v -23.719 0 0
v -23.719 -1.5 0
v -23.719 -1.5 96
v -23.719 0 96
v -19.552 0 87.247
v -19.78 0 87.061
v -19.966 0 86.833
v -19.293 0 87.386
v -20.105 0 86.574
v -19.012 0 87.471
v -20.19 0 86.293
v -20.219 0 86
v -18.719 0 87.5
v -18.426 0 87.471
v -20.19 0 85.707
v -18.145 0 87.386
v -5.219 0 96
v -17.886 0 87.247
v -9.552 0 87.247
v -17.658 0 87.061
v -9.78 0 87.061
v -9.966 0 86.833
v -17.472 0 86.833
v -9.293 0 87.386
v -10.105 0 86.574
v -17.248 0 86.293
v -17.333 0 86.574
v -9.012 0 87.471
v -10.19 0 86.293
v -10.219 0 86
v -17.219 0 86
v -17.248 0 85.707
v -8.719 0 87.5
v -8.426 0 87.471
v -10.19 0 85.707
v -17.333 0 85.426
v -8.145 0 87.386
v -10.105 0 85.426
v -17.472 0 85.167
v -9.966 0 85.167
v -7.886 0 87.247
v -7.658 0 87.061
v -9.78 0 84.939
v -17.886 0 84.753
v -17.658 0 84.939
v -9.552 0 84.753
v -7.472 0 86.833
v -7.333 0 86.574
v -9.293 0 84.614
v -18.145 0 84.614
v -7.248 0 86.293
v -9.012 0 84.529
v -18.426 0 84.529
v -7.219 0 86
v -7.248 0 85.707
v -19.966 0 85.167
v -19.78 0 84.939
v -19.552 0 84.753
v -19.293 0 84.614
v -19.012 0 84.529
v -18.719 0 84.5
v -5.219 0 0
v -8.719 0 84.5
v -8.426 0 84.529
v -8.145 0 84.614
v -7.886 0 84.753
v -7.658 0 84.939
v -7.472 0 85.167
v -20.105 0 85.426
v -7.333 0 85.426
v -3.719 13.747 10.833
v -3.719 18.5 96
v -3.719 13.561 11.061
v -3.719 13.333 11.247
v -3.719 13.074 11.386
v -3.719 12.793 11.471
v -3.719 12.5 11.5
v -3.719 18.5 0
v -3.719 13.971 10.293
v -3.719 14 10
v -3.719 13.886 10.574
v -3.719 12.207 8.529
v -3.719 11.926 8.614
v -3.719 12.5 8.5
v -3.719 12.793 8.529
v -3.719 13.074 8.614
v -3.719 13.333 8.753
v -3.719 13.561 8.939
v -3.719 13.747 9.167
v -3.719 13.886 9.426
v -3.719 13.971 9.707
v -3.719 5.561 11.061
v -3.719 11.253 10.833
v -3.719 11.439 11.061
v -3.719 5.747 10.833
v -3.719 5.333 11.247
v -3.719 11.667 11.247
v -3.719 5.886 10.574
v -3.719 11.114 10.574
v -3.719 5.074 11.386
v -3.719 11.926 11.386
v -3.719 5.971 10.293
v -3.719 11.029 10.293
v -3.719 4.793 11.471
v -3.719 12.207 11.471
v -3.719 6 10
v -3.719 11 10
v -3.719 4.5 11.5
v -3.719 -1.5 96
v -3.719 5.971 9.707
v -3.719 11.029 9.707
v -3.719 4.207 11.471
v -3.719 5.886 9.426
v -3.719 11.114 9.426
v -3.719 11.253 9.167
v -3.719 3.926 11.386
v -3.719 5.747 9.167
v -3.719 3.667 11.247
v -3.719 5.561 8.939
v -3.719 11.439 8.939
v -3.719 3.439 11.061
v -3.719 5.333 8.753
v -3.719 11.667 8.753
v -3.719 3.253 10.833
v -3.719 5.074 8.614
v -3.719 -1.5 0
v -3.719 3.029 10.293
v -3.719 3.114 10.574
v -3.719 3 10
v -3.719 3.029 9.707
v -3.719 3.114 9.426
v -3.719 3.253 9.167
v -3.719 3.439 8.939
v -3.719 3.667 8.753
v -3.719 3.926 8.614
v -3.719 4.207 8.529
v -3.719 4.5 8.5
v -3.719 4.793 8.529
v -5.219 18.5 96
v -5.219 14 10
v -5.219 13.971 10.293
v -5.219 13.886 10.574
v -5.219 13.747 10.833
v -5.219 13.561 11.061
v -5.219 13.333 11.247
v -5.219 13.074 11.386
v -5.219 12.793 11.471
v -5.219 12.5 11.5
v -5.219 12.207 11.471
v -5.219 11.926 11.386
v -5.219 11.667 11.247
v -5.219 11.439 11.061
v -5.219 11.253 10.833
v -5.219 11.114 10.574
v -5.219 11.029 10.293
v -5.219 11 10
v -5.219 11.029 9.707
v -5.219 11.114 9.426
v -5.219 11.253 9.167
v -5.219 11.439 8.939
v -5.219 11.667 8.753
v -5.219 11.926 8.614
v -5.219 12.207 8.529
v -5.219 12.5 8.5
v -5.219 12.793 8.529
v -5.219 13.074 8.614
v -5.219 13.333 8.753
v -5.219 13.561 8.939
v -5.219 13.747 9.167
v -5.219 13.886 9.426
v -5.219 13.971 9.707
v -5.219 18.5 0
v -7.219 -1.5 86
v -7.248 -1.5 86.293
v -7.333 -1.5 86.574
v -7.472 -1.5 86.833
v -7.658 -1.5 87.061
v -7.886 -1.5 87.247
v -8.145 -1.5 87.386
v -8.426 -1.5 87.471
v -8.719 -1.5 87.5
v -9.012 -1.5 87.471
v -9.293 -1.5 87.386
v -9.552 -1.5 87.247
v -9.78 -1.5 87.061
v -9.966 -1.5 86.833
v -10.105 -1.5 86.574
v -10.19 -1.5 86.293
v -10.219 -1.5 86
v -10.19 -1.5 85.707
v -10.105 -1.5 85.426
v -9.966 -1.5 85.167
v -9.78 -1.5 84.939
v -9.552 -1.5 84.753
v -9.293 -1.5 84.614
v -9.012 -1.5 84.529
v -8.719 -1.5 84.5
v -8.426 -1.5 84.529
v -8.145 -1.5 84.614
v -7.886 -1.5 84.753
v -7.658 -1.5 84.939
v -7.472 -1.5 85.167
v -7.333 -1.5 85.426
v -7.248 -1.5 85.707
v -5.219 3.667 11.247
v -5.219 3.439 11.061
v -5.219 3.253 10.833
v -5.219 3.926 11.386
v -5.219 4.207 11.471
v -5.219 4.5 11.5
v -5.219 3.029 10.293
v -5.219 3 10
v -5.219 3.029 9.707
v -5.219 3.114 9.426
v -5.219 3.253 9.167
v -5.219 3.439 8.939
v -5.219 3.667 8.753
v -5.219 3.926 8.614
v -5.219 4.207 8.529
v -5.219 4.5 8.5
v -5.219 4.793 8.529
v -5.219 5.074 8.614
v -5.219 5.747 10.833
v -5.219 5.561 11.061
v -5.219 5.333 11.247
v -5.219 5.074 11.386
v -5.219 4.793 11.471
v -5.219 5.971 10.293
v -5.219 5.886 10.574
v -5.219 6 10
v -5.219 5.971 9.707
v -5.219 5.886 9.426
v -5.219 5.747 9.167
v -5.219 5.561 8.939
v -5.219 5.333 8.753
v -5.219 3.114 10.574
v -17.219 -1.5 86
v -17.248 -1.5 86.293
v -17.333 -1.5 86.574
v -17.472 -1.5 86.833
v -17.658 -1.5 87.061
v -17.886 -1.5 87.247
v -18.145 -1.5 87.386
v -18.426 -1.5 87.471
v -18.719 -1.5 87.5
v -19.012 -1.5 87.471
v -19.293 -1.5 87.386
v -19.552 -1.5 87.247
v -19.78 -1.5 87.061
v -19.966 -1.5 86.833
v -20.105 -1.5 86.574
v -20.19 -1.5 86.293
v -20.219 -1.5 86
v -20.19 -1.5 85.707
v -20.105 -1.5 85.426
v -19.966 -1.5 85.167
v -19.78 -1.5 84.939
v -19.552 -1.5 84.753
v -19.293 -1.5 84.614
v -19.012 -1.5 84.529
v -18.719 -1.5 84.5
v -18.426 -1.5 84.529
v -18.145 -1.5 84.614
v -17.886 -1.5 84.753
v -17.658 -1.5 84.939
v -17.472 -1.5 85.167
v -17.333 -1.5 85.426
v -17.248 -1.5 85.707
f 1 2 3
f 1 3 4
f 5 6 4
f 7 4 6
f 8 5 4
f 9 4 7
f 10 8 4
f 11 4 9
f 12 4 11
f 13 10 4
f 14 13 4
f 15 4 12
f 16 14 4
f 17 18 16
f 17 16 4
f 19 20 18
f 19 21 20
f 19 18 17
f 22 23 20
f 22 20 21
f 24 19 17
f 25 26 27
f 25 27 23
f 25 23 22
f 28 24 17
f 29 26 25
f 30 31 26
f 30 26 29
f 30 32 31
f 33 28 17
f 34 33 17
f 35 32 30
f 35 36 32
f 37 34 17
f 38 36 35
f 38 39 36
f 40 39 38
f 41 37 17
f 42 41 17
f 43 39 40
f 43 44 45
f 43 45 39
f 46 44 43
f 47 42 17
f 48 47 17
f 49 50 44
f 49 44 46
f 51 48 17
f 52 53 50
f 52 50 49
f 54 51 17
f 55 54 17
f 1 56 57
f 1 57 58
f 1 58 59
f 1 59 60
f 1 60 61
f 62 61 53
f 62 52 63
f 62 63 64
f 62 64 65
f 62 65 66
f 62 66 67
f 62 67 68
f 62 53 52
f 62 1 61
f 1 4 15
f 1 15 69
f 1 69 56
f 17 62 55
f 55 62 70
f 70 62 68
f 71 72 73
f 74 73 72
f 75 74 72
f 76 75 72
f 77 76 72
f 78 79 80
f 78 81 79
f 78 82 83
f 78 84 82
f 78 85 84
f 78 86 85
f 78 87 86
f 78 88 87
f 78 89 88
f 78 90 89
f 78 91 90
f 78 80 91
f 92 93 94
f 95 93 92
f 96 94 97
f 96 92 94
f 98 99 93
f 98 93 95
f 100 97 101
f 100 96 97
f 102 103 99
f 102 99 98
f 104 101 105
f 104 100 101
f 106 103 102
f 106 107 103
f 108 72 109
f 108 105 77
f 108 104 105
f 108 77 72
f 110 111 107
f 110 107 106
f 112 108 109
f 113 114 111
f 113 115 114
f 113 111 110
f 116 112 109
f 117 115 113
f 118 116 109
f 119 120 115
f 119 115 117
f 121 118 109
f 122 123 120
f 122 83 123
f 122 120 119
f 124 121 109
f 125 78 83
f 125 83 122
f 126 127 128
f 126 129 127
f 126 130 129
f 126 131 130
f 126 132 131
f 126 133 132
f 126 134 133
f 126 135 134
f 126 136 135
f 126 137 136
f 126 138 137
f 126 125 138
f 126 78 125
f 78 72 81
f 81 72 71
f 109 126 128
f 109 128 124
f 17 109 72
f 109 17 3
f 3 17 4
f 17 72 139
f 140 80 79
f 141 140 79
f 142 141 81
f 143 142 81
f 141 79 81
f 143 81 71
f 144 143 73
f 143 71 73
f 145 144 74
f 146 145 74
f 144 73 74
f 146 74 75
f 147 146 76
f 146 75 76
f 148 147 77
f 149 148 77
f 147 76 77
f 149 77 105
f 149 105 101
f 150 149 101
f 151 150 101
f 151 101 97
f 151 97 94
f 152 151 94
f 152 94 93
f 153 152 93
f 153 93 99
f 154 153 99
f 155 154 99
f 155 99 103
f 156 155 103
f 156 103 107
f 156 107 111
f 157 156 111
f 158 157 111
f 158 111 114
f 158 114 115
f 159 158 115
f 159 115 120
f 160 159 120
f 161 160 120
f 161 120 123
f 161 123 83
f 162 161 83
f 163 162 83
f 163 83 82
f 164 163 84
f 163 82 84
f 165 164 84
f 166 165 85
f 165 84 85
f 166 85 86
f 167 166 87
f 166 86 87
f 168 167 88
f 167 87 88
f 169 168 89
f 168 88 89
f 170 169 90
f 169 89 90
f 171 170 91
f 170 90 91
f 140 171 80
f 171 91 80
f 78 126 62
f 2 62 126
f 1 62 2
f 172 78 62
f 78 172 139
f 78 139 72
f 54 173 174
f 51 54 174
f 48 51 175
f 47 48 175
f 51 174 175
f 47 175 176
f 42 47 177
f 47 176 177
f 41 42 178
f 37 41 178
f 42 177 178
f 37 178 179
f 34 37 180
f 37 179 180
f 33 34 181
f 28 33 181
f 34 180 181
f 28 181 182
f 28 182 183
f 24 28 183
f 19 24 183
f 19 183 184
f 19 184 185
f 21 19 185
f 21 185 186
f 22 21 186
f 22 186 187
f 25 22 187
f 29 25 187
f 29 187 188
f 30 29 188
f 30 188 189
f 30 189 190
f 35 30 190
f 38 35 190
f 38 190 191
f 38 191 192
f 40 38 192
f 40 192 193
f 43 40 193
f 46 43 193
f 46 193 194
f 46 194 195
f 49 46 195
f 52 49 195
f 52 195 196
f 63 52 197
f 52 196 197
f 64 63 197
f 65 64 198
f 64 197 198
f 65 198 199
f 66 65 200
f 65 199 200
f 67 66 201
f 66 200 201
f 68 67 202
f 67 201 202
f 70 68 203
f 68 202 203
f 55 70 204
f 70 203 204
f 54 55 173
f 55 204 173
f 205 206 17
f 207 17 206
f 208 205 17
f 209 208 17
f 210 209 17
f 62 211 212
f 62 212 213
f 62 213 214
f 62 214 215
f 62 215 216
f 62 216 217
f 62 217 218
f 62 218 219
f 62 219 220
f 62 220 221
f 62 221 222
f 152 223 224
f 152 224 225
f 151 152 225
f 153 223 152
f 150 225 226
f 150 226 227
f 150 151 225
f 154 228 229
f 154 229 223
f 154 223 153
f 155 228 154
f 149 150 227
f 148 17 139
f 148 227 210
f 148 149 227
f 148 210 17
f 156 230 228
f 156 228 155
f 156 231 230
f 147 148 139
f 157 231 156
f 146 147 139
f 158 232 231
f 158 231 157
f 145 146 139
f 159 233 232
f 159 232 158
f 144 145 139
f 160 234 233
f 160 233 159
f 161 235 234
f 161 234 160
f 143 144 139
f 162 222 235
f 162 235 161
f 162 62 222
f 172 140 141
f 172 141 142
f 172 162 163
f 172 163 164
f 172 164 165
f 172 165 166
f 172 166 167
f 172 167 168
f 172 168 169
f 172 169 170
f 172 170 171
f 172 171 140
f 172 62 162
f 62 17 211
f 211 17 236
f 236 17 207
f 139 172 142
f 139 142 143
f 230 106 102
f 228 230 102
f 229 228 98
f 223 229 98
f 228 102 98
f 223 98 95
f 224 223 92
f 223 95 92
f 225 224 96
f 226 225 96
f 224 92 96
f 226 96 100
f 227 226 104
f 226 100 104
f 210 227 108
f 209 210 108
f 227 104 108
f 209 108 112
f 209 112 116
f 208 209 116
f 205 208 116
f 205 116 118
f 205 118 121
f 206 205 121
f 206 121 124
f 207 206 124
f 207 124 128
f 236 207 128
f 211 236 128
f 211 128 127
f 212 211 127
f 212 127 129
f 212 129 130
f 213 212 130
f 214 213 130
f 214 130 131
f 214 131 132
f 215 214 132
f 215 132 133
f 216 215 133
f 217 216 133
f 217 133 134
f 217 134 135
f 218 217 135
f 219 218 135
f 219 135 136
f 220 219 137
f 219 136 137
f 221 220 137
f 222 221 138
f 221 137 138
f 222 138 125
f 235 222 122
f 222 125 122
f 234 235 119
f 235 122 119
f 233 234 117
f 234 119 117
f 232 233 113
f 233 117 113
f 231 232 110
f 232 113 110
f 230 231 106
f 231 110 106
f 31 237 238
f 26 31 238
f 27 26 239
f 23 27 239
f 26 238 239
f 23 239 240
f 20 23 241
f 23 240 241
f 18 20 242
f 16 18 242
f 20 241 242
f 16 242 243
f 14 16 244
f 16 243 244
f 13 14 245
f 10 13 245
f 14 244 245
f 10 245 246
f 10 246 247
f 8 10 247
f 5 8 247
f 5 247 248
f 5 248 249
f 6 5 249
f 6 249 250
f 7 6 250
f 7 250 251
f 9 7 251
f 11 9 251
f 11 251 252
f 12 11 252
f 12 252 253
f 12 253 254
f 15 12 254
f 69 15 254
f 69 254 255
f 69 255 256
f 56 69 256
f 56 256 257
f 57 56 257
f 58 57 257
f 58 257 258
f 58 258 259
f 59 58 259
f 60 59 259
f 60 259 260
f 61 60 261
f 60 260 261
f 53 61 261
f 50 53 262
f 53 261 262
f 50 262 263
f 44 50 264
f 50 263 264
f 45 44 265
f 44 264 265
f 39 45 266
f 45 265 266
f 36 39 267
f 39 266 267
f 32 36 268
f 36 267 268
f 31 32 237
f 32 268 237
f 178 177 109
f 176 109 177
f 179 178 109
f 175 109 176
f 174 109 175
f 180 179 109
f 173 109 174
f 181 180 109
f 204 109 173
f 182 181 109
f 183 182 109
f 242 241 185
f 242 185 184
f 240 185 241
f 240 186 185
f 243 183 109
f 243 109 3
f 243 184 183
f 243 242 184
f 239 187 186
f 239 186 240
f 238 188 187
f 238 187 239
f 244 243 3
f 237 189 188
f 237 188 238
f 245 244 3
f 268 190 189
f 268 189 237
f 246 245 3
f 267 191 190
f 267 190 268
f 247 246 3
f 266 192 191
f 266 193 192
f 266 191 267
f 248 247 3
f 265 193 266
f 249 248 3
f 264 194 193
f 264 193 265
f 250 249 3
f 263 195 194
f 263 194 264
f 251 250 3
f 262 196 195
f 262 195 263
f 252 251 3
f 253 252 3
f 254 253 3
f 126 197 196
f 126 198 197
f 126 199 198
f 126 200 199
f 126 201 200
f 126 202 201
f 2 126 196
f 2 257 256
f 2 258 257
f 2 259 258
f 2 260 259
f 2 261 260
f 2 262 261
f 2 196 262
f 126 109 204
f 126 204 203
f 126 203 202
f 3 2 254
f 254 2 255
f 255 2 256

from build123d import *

# Parameters (mm, degrees)
EXTRUSION1_DEPTH = 96
ESQUISSE2_R      = 1.5
EXTRUSION2_DEPTH = 70
ESQUISSE3_R      = 1.5
EXTRUSION3_DEPTH = 10


with BuildPart() as part:
    # Esquisse1 → Extrusion1 (new body)
    with BuildSketch(Plane.XY):
        Polygon((-3.718958969, 18.5), (-3.718958969, -1.5), (-23.718958969, -1.5), (-23.718958969, 0), (-5.218958969, 0), (-5.218958969, 18.5), align=None)
    extrude(amount=EXTRUSION1_DEPTH)

    # Esquisse2 → Extrusion2 (cut)
    with BuildSketch(Plane.XZ.offset(1.5)):
        with Locations((-8.718958969, 86)):
            Circle(ESQUISSE2_R)
        with Locations((-18.718958969, 86)):
            Circle(ESQUISSE2_R)
    extrude(amount=-EXTRUSION2_DEPTH, mode=Mode.SUBTRACT)

    # Esquisse3 → Extrusion3 (cut)
    with BuildSketch(Plane(origin=(-3.718958969, 0, 0), x_dir=(0, 0, -1), z_dir=(1, 0, 0))):
        with Locations(Location((-10, 12.5, 0), (0, 0, 90))):
            Circle(ESQUISSE3_R)
        with Locations(Location((-10, 4.5, 0), (0, 0, 90))):
            Circle(ESQUISSE3_R)
    extrude(amount=-EXTRUSION3_DEPTH, mode=Mode.SUBTRACT)


solid = part.part
